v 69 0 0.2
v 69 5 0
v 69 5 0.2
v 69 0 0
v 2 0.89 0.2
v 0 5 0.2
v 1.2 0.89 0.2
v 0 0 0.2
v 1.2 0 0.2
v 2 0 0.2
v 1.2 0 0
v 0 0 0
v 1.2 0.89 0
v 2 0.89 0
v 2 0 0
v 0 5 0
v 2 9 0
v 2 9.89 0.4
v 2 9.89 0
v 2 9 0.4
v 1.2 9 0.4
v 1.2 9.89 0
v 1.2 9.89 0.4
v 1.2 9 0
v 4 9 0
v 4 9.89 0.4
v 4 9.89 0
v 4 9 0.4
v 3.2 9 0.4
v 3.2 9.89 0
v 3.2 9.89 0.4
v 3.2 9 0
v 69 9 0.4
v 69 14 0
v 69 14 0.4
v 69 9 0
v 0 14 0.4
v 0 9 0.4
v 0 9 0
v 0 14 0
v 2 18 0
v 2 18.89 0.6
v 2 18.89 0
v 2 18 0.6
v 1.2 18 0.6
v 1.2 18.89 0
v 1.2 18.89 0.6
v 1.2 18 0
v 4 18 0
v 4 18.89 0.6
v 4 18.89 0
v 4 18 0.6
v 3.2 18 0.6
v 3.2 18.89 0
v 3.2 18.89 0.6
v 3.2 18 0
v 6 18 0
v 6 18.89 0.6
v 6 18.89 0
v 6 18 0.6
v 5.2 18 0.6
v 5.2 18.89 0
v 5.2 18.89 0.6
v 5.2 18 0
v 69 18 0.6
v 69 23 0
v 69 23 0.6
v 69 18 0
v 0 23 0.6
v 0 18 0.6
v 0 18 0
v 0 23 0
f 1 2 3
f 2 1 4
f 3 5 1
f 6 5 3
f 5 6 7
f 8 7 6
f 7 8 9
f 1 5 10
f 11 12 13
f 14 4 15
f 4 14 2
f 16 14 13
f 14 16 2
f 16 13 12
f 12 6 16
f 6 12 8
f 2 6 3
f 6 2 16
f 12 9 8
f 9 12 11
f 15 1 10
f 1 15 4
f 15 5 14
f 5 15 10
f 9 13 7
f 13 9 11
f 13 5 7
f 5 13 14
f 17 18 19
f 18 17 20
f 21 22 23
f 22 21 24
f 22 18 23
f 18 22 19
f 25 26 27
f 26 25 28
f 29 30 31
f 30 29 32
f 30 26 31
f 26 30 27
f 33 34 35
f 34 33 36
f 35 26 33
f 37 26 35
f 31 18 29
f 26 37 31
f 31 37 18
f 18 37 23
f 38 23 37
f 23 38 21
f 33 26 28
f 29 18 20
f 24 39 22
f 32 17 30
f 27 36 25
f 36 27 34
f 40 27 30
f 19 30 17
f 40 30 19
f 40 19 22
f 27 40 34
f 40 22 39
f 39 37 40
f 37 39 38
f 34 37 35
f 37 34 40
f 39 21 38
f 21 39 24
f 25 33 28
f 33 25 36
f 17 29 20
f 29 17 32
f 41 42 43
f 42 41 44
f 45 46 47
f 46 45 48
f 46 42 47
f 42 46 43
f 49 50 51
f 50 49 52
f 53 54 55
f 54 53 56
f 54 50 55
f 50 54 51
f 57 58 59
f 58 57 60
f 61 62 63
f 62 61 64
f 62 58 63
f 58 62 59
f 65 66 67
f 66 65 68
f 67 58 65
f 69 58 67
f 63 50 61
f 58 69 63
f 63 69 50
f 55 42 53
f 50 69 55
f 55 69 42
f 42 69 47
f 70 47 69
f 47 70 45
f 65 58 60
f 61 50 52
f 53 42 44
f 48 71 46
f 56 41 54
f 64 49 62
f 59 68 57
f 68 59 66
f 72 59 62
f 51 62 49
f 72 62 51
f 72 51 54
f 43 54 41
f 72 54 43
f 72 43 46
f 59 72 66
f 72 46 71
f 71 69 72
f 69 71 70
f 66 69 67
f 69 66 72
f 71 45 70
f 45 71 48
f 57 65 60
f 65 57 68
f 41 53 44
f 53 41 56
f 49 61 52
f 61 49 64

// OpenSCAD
// Magnet wrap strips (Paul's idea, 2026-10-07): a flat PLA strip wrapped
// once round a 21.5mm magnet before it goes into one of the already-printed
// 22.4mm holes. 69mm long (the magnet's circumference is ~67.5mm, so the ends
// overlap ~1.5mm), 5mm wide, 1, 2 or 3 layers thick at 0.2mm layers.
// The gap each side in a true 22.4 hole is (22.4 - 21.5)/2 = 0.45mm, so the
// 2-layer (0.4) strip is the nominal match; 0.6 is tight, 0.2 loose.
// ID: notches in one end, 1 notch = 1 layer, 2 = 2, 3 = 3.
// Print flat, PLA, 0.2mm layer height (first layer 0.2 too, or the 1-layer
// strip comes out at the first-layer height).
lay = 0.2; L = 69; Wd = 5;
module strip(n) {
    difference() {
        cube([L, Wd, n * lay]);
        for (k = [0 : n - 1]) translate([1.2 + k * 2.0, -0.01, -0.1]) cube([0.8, 0.9, n * lay + 0.2]);
    }
}
for (n = [1 : 3]) translate([0, (n - 1) * 9, 0]) strip(n);
